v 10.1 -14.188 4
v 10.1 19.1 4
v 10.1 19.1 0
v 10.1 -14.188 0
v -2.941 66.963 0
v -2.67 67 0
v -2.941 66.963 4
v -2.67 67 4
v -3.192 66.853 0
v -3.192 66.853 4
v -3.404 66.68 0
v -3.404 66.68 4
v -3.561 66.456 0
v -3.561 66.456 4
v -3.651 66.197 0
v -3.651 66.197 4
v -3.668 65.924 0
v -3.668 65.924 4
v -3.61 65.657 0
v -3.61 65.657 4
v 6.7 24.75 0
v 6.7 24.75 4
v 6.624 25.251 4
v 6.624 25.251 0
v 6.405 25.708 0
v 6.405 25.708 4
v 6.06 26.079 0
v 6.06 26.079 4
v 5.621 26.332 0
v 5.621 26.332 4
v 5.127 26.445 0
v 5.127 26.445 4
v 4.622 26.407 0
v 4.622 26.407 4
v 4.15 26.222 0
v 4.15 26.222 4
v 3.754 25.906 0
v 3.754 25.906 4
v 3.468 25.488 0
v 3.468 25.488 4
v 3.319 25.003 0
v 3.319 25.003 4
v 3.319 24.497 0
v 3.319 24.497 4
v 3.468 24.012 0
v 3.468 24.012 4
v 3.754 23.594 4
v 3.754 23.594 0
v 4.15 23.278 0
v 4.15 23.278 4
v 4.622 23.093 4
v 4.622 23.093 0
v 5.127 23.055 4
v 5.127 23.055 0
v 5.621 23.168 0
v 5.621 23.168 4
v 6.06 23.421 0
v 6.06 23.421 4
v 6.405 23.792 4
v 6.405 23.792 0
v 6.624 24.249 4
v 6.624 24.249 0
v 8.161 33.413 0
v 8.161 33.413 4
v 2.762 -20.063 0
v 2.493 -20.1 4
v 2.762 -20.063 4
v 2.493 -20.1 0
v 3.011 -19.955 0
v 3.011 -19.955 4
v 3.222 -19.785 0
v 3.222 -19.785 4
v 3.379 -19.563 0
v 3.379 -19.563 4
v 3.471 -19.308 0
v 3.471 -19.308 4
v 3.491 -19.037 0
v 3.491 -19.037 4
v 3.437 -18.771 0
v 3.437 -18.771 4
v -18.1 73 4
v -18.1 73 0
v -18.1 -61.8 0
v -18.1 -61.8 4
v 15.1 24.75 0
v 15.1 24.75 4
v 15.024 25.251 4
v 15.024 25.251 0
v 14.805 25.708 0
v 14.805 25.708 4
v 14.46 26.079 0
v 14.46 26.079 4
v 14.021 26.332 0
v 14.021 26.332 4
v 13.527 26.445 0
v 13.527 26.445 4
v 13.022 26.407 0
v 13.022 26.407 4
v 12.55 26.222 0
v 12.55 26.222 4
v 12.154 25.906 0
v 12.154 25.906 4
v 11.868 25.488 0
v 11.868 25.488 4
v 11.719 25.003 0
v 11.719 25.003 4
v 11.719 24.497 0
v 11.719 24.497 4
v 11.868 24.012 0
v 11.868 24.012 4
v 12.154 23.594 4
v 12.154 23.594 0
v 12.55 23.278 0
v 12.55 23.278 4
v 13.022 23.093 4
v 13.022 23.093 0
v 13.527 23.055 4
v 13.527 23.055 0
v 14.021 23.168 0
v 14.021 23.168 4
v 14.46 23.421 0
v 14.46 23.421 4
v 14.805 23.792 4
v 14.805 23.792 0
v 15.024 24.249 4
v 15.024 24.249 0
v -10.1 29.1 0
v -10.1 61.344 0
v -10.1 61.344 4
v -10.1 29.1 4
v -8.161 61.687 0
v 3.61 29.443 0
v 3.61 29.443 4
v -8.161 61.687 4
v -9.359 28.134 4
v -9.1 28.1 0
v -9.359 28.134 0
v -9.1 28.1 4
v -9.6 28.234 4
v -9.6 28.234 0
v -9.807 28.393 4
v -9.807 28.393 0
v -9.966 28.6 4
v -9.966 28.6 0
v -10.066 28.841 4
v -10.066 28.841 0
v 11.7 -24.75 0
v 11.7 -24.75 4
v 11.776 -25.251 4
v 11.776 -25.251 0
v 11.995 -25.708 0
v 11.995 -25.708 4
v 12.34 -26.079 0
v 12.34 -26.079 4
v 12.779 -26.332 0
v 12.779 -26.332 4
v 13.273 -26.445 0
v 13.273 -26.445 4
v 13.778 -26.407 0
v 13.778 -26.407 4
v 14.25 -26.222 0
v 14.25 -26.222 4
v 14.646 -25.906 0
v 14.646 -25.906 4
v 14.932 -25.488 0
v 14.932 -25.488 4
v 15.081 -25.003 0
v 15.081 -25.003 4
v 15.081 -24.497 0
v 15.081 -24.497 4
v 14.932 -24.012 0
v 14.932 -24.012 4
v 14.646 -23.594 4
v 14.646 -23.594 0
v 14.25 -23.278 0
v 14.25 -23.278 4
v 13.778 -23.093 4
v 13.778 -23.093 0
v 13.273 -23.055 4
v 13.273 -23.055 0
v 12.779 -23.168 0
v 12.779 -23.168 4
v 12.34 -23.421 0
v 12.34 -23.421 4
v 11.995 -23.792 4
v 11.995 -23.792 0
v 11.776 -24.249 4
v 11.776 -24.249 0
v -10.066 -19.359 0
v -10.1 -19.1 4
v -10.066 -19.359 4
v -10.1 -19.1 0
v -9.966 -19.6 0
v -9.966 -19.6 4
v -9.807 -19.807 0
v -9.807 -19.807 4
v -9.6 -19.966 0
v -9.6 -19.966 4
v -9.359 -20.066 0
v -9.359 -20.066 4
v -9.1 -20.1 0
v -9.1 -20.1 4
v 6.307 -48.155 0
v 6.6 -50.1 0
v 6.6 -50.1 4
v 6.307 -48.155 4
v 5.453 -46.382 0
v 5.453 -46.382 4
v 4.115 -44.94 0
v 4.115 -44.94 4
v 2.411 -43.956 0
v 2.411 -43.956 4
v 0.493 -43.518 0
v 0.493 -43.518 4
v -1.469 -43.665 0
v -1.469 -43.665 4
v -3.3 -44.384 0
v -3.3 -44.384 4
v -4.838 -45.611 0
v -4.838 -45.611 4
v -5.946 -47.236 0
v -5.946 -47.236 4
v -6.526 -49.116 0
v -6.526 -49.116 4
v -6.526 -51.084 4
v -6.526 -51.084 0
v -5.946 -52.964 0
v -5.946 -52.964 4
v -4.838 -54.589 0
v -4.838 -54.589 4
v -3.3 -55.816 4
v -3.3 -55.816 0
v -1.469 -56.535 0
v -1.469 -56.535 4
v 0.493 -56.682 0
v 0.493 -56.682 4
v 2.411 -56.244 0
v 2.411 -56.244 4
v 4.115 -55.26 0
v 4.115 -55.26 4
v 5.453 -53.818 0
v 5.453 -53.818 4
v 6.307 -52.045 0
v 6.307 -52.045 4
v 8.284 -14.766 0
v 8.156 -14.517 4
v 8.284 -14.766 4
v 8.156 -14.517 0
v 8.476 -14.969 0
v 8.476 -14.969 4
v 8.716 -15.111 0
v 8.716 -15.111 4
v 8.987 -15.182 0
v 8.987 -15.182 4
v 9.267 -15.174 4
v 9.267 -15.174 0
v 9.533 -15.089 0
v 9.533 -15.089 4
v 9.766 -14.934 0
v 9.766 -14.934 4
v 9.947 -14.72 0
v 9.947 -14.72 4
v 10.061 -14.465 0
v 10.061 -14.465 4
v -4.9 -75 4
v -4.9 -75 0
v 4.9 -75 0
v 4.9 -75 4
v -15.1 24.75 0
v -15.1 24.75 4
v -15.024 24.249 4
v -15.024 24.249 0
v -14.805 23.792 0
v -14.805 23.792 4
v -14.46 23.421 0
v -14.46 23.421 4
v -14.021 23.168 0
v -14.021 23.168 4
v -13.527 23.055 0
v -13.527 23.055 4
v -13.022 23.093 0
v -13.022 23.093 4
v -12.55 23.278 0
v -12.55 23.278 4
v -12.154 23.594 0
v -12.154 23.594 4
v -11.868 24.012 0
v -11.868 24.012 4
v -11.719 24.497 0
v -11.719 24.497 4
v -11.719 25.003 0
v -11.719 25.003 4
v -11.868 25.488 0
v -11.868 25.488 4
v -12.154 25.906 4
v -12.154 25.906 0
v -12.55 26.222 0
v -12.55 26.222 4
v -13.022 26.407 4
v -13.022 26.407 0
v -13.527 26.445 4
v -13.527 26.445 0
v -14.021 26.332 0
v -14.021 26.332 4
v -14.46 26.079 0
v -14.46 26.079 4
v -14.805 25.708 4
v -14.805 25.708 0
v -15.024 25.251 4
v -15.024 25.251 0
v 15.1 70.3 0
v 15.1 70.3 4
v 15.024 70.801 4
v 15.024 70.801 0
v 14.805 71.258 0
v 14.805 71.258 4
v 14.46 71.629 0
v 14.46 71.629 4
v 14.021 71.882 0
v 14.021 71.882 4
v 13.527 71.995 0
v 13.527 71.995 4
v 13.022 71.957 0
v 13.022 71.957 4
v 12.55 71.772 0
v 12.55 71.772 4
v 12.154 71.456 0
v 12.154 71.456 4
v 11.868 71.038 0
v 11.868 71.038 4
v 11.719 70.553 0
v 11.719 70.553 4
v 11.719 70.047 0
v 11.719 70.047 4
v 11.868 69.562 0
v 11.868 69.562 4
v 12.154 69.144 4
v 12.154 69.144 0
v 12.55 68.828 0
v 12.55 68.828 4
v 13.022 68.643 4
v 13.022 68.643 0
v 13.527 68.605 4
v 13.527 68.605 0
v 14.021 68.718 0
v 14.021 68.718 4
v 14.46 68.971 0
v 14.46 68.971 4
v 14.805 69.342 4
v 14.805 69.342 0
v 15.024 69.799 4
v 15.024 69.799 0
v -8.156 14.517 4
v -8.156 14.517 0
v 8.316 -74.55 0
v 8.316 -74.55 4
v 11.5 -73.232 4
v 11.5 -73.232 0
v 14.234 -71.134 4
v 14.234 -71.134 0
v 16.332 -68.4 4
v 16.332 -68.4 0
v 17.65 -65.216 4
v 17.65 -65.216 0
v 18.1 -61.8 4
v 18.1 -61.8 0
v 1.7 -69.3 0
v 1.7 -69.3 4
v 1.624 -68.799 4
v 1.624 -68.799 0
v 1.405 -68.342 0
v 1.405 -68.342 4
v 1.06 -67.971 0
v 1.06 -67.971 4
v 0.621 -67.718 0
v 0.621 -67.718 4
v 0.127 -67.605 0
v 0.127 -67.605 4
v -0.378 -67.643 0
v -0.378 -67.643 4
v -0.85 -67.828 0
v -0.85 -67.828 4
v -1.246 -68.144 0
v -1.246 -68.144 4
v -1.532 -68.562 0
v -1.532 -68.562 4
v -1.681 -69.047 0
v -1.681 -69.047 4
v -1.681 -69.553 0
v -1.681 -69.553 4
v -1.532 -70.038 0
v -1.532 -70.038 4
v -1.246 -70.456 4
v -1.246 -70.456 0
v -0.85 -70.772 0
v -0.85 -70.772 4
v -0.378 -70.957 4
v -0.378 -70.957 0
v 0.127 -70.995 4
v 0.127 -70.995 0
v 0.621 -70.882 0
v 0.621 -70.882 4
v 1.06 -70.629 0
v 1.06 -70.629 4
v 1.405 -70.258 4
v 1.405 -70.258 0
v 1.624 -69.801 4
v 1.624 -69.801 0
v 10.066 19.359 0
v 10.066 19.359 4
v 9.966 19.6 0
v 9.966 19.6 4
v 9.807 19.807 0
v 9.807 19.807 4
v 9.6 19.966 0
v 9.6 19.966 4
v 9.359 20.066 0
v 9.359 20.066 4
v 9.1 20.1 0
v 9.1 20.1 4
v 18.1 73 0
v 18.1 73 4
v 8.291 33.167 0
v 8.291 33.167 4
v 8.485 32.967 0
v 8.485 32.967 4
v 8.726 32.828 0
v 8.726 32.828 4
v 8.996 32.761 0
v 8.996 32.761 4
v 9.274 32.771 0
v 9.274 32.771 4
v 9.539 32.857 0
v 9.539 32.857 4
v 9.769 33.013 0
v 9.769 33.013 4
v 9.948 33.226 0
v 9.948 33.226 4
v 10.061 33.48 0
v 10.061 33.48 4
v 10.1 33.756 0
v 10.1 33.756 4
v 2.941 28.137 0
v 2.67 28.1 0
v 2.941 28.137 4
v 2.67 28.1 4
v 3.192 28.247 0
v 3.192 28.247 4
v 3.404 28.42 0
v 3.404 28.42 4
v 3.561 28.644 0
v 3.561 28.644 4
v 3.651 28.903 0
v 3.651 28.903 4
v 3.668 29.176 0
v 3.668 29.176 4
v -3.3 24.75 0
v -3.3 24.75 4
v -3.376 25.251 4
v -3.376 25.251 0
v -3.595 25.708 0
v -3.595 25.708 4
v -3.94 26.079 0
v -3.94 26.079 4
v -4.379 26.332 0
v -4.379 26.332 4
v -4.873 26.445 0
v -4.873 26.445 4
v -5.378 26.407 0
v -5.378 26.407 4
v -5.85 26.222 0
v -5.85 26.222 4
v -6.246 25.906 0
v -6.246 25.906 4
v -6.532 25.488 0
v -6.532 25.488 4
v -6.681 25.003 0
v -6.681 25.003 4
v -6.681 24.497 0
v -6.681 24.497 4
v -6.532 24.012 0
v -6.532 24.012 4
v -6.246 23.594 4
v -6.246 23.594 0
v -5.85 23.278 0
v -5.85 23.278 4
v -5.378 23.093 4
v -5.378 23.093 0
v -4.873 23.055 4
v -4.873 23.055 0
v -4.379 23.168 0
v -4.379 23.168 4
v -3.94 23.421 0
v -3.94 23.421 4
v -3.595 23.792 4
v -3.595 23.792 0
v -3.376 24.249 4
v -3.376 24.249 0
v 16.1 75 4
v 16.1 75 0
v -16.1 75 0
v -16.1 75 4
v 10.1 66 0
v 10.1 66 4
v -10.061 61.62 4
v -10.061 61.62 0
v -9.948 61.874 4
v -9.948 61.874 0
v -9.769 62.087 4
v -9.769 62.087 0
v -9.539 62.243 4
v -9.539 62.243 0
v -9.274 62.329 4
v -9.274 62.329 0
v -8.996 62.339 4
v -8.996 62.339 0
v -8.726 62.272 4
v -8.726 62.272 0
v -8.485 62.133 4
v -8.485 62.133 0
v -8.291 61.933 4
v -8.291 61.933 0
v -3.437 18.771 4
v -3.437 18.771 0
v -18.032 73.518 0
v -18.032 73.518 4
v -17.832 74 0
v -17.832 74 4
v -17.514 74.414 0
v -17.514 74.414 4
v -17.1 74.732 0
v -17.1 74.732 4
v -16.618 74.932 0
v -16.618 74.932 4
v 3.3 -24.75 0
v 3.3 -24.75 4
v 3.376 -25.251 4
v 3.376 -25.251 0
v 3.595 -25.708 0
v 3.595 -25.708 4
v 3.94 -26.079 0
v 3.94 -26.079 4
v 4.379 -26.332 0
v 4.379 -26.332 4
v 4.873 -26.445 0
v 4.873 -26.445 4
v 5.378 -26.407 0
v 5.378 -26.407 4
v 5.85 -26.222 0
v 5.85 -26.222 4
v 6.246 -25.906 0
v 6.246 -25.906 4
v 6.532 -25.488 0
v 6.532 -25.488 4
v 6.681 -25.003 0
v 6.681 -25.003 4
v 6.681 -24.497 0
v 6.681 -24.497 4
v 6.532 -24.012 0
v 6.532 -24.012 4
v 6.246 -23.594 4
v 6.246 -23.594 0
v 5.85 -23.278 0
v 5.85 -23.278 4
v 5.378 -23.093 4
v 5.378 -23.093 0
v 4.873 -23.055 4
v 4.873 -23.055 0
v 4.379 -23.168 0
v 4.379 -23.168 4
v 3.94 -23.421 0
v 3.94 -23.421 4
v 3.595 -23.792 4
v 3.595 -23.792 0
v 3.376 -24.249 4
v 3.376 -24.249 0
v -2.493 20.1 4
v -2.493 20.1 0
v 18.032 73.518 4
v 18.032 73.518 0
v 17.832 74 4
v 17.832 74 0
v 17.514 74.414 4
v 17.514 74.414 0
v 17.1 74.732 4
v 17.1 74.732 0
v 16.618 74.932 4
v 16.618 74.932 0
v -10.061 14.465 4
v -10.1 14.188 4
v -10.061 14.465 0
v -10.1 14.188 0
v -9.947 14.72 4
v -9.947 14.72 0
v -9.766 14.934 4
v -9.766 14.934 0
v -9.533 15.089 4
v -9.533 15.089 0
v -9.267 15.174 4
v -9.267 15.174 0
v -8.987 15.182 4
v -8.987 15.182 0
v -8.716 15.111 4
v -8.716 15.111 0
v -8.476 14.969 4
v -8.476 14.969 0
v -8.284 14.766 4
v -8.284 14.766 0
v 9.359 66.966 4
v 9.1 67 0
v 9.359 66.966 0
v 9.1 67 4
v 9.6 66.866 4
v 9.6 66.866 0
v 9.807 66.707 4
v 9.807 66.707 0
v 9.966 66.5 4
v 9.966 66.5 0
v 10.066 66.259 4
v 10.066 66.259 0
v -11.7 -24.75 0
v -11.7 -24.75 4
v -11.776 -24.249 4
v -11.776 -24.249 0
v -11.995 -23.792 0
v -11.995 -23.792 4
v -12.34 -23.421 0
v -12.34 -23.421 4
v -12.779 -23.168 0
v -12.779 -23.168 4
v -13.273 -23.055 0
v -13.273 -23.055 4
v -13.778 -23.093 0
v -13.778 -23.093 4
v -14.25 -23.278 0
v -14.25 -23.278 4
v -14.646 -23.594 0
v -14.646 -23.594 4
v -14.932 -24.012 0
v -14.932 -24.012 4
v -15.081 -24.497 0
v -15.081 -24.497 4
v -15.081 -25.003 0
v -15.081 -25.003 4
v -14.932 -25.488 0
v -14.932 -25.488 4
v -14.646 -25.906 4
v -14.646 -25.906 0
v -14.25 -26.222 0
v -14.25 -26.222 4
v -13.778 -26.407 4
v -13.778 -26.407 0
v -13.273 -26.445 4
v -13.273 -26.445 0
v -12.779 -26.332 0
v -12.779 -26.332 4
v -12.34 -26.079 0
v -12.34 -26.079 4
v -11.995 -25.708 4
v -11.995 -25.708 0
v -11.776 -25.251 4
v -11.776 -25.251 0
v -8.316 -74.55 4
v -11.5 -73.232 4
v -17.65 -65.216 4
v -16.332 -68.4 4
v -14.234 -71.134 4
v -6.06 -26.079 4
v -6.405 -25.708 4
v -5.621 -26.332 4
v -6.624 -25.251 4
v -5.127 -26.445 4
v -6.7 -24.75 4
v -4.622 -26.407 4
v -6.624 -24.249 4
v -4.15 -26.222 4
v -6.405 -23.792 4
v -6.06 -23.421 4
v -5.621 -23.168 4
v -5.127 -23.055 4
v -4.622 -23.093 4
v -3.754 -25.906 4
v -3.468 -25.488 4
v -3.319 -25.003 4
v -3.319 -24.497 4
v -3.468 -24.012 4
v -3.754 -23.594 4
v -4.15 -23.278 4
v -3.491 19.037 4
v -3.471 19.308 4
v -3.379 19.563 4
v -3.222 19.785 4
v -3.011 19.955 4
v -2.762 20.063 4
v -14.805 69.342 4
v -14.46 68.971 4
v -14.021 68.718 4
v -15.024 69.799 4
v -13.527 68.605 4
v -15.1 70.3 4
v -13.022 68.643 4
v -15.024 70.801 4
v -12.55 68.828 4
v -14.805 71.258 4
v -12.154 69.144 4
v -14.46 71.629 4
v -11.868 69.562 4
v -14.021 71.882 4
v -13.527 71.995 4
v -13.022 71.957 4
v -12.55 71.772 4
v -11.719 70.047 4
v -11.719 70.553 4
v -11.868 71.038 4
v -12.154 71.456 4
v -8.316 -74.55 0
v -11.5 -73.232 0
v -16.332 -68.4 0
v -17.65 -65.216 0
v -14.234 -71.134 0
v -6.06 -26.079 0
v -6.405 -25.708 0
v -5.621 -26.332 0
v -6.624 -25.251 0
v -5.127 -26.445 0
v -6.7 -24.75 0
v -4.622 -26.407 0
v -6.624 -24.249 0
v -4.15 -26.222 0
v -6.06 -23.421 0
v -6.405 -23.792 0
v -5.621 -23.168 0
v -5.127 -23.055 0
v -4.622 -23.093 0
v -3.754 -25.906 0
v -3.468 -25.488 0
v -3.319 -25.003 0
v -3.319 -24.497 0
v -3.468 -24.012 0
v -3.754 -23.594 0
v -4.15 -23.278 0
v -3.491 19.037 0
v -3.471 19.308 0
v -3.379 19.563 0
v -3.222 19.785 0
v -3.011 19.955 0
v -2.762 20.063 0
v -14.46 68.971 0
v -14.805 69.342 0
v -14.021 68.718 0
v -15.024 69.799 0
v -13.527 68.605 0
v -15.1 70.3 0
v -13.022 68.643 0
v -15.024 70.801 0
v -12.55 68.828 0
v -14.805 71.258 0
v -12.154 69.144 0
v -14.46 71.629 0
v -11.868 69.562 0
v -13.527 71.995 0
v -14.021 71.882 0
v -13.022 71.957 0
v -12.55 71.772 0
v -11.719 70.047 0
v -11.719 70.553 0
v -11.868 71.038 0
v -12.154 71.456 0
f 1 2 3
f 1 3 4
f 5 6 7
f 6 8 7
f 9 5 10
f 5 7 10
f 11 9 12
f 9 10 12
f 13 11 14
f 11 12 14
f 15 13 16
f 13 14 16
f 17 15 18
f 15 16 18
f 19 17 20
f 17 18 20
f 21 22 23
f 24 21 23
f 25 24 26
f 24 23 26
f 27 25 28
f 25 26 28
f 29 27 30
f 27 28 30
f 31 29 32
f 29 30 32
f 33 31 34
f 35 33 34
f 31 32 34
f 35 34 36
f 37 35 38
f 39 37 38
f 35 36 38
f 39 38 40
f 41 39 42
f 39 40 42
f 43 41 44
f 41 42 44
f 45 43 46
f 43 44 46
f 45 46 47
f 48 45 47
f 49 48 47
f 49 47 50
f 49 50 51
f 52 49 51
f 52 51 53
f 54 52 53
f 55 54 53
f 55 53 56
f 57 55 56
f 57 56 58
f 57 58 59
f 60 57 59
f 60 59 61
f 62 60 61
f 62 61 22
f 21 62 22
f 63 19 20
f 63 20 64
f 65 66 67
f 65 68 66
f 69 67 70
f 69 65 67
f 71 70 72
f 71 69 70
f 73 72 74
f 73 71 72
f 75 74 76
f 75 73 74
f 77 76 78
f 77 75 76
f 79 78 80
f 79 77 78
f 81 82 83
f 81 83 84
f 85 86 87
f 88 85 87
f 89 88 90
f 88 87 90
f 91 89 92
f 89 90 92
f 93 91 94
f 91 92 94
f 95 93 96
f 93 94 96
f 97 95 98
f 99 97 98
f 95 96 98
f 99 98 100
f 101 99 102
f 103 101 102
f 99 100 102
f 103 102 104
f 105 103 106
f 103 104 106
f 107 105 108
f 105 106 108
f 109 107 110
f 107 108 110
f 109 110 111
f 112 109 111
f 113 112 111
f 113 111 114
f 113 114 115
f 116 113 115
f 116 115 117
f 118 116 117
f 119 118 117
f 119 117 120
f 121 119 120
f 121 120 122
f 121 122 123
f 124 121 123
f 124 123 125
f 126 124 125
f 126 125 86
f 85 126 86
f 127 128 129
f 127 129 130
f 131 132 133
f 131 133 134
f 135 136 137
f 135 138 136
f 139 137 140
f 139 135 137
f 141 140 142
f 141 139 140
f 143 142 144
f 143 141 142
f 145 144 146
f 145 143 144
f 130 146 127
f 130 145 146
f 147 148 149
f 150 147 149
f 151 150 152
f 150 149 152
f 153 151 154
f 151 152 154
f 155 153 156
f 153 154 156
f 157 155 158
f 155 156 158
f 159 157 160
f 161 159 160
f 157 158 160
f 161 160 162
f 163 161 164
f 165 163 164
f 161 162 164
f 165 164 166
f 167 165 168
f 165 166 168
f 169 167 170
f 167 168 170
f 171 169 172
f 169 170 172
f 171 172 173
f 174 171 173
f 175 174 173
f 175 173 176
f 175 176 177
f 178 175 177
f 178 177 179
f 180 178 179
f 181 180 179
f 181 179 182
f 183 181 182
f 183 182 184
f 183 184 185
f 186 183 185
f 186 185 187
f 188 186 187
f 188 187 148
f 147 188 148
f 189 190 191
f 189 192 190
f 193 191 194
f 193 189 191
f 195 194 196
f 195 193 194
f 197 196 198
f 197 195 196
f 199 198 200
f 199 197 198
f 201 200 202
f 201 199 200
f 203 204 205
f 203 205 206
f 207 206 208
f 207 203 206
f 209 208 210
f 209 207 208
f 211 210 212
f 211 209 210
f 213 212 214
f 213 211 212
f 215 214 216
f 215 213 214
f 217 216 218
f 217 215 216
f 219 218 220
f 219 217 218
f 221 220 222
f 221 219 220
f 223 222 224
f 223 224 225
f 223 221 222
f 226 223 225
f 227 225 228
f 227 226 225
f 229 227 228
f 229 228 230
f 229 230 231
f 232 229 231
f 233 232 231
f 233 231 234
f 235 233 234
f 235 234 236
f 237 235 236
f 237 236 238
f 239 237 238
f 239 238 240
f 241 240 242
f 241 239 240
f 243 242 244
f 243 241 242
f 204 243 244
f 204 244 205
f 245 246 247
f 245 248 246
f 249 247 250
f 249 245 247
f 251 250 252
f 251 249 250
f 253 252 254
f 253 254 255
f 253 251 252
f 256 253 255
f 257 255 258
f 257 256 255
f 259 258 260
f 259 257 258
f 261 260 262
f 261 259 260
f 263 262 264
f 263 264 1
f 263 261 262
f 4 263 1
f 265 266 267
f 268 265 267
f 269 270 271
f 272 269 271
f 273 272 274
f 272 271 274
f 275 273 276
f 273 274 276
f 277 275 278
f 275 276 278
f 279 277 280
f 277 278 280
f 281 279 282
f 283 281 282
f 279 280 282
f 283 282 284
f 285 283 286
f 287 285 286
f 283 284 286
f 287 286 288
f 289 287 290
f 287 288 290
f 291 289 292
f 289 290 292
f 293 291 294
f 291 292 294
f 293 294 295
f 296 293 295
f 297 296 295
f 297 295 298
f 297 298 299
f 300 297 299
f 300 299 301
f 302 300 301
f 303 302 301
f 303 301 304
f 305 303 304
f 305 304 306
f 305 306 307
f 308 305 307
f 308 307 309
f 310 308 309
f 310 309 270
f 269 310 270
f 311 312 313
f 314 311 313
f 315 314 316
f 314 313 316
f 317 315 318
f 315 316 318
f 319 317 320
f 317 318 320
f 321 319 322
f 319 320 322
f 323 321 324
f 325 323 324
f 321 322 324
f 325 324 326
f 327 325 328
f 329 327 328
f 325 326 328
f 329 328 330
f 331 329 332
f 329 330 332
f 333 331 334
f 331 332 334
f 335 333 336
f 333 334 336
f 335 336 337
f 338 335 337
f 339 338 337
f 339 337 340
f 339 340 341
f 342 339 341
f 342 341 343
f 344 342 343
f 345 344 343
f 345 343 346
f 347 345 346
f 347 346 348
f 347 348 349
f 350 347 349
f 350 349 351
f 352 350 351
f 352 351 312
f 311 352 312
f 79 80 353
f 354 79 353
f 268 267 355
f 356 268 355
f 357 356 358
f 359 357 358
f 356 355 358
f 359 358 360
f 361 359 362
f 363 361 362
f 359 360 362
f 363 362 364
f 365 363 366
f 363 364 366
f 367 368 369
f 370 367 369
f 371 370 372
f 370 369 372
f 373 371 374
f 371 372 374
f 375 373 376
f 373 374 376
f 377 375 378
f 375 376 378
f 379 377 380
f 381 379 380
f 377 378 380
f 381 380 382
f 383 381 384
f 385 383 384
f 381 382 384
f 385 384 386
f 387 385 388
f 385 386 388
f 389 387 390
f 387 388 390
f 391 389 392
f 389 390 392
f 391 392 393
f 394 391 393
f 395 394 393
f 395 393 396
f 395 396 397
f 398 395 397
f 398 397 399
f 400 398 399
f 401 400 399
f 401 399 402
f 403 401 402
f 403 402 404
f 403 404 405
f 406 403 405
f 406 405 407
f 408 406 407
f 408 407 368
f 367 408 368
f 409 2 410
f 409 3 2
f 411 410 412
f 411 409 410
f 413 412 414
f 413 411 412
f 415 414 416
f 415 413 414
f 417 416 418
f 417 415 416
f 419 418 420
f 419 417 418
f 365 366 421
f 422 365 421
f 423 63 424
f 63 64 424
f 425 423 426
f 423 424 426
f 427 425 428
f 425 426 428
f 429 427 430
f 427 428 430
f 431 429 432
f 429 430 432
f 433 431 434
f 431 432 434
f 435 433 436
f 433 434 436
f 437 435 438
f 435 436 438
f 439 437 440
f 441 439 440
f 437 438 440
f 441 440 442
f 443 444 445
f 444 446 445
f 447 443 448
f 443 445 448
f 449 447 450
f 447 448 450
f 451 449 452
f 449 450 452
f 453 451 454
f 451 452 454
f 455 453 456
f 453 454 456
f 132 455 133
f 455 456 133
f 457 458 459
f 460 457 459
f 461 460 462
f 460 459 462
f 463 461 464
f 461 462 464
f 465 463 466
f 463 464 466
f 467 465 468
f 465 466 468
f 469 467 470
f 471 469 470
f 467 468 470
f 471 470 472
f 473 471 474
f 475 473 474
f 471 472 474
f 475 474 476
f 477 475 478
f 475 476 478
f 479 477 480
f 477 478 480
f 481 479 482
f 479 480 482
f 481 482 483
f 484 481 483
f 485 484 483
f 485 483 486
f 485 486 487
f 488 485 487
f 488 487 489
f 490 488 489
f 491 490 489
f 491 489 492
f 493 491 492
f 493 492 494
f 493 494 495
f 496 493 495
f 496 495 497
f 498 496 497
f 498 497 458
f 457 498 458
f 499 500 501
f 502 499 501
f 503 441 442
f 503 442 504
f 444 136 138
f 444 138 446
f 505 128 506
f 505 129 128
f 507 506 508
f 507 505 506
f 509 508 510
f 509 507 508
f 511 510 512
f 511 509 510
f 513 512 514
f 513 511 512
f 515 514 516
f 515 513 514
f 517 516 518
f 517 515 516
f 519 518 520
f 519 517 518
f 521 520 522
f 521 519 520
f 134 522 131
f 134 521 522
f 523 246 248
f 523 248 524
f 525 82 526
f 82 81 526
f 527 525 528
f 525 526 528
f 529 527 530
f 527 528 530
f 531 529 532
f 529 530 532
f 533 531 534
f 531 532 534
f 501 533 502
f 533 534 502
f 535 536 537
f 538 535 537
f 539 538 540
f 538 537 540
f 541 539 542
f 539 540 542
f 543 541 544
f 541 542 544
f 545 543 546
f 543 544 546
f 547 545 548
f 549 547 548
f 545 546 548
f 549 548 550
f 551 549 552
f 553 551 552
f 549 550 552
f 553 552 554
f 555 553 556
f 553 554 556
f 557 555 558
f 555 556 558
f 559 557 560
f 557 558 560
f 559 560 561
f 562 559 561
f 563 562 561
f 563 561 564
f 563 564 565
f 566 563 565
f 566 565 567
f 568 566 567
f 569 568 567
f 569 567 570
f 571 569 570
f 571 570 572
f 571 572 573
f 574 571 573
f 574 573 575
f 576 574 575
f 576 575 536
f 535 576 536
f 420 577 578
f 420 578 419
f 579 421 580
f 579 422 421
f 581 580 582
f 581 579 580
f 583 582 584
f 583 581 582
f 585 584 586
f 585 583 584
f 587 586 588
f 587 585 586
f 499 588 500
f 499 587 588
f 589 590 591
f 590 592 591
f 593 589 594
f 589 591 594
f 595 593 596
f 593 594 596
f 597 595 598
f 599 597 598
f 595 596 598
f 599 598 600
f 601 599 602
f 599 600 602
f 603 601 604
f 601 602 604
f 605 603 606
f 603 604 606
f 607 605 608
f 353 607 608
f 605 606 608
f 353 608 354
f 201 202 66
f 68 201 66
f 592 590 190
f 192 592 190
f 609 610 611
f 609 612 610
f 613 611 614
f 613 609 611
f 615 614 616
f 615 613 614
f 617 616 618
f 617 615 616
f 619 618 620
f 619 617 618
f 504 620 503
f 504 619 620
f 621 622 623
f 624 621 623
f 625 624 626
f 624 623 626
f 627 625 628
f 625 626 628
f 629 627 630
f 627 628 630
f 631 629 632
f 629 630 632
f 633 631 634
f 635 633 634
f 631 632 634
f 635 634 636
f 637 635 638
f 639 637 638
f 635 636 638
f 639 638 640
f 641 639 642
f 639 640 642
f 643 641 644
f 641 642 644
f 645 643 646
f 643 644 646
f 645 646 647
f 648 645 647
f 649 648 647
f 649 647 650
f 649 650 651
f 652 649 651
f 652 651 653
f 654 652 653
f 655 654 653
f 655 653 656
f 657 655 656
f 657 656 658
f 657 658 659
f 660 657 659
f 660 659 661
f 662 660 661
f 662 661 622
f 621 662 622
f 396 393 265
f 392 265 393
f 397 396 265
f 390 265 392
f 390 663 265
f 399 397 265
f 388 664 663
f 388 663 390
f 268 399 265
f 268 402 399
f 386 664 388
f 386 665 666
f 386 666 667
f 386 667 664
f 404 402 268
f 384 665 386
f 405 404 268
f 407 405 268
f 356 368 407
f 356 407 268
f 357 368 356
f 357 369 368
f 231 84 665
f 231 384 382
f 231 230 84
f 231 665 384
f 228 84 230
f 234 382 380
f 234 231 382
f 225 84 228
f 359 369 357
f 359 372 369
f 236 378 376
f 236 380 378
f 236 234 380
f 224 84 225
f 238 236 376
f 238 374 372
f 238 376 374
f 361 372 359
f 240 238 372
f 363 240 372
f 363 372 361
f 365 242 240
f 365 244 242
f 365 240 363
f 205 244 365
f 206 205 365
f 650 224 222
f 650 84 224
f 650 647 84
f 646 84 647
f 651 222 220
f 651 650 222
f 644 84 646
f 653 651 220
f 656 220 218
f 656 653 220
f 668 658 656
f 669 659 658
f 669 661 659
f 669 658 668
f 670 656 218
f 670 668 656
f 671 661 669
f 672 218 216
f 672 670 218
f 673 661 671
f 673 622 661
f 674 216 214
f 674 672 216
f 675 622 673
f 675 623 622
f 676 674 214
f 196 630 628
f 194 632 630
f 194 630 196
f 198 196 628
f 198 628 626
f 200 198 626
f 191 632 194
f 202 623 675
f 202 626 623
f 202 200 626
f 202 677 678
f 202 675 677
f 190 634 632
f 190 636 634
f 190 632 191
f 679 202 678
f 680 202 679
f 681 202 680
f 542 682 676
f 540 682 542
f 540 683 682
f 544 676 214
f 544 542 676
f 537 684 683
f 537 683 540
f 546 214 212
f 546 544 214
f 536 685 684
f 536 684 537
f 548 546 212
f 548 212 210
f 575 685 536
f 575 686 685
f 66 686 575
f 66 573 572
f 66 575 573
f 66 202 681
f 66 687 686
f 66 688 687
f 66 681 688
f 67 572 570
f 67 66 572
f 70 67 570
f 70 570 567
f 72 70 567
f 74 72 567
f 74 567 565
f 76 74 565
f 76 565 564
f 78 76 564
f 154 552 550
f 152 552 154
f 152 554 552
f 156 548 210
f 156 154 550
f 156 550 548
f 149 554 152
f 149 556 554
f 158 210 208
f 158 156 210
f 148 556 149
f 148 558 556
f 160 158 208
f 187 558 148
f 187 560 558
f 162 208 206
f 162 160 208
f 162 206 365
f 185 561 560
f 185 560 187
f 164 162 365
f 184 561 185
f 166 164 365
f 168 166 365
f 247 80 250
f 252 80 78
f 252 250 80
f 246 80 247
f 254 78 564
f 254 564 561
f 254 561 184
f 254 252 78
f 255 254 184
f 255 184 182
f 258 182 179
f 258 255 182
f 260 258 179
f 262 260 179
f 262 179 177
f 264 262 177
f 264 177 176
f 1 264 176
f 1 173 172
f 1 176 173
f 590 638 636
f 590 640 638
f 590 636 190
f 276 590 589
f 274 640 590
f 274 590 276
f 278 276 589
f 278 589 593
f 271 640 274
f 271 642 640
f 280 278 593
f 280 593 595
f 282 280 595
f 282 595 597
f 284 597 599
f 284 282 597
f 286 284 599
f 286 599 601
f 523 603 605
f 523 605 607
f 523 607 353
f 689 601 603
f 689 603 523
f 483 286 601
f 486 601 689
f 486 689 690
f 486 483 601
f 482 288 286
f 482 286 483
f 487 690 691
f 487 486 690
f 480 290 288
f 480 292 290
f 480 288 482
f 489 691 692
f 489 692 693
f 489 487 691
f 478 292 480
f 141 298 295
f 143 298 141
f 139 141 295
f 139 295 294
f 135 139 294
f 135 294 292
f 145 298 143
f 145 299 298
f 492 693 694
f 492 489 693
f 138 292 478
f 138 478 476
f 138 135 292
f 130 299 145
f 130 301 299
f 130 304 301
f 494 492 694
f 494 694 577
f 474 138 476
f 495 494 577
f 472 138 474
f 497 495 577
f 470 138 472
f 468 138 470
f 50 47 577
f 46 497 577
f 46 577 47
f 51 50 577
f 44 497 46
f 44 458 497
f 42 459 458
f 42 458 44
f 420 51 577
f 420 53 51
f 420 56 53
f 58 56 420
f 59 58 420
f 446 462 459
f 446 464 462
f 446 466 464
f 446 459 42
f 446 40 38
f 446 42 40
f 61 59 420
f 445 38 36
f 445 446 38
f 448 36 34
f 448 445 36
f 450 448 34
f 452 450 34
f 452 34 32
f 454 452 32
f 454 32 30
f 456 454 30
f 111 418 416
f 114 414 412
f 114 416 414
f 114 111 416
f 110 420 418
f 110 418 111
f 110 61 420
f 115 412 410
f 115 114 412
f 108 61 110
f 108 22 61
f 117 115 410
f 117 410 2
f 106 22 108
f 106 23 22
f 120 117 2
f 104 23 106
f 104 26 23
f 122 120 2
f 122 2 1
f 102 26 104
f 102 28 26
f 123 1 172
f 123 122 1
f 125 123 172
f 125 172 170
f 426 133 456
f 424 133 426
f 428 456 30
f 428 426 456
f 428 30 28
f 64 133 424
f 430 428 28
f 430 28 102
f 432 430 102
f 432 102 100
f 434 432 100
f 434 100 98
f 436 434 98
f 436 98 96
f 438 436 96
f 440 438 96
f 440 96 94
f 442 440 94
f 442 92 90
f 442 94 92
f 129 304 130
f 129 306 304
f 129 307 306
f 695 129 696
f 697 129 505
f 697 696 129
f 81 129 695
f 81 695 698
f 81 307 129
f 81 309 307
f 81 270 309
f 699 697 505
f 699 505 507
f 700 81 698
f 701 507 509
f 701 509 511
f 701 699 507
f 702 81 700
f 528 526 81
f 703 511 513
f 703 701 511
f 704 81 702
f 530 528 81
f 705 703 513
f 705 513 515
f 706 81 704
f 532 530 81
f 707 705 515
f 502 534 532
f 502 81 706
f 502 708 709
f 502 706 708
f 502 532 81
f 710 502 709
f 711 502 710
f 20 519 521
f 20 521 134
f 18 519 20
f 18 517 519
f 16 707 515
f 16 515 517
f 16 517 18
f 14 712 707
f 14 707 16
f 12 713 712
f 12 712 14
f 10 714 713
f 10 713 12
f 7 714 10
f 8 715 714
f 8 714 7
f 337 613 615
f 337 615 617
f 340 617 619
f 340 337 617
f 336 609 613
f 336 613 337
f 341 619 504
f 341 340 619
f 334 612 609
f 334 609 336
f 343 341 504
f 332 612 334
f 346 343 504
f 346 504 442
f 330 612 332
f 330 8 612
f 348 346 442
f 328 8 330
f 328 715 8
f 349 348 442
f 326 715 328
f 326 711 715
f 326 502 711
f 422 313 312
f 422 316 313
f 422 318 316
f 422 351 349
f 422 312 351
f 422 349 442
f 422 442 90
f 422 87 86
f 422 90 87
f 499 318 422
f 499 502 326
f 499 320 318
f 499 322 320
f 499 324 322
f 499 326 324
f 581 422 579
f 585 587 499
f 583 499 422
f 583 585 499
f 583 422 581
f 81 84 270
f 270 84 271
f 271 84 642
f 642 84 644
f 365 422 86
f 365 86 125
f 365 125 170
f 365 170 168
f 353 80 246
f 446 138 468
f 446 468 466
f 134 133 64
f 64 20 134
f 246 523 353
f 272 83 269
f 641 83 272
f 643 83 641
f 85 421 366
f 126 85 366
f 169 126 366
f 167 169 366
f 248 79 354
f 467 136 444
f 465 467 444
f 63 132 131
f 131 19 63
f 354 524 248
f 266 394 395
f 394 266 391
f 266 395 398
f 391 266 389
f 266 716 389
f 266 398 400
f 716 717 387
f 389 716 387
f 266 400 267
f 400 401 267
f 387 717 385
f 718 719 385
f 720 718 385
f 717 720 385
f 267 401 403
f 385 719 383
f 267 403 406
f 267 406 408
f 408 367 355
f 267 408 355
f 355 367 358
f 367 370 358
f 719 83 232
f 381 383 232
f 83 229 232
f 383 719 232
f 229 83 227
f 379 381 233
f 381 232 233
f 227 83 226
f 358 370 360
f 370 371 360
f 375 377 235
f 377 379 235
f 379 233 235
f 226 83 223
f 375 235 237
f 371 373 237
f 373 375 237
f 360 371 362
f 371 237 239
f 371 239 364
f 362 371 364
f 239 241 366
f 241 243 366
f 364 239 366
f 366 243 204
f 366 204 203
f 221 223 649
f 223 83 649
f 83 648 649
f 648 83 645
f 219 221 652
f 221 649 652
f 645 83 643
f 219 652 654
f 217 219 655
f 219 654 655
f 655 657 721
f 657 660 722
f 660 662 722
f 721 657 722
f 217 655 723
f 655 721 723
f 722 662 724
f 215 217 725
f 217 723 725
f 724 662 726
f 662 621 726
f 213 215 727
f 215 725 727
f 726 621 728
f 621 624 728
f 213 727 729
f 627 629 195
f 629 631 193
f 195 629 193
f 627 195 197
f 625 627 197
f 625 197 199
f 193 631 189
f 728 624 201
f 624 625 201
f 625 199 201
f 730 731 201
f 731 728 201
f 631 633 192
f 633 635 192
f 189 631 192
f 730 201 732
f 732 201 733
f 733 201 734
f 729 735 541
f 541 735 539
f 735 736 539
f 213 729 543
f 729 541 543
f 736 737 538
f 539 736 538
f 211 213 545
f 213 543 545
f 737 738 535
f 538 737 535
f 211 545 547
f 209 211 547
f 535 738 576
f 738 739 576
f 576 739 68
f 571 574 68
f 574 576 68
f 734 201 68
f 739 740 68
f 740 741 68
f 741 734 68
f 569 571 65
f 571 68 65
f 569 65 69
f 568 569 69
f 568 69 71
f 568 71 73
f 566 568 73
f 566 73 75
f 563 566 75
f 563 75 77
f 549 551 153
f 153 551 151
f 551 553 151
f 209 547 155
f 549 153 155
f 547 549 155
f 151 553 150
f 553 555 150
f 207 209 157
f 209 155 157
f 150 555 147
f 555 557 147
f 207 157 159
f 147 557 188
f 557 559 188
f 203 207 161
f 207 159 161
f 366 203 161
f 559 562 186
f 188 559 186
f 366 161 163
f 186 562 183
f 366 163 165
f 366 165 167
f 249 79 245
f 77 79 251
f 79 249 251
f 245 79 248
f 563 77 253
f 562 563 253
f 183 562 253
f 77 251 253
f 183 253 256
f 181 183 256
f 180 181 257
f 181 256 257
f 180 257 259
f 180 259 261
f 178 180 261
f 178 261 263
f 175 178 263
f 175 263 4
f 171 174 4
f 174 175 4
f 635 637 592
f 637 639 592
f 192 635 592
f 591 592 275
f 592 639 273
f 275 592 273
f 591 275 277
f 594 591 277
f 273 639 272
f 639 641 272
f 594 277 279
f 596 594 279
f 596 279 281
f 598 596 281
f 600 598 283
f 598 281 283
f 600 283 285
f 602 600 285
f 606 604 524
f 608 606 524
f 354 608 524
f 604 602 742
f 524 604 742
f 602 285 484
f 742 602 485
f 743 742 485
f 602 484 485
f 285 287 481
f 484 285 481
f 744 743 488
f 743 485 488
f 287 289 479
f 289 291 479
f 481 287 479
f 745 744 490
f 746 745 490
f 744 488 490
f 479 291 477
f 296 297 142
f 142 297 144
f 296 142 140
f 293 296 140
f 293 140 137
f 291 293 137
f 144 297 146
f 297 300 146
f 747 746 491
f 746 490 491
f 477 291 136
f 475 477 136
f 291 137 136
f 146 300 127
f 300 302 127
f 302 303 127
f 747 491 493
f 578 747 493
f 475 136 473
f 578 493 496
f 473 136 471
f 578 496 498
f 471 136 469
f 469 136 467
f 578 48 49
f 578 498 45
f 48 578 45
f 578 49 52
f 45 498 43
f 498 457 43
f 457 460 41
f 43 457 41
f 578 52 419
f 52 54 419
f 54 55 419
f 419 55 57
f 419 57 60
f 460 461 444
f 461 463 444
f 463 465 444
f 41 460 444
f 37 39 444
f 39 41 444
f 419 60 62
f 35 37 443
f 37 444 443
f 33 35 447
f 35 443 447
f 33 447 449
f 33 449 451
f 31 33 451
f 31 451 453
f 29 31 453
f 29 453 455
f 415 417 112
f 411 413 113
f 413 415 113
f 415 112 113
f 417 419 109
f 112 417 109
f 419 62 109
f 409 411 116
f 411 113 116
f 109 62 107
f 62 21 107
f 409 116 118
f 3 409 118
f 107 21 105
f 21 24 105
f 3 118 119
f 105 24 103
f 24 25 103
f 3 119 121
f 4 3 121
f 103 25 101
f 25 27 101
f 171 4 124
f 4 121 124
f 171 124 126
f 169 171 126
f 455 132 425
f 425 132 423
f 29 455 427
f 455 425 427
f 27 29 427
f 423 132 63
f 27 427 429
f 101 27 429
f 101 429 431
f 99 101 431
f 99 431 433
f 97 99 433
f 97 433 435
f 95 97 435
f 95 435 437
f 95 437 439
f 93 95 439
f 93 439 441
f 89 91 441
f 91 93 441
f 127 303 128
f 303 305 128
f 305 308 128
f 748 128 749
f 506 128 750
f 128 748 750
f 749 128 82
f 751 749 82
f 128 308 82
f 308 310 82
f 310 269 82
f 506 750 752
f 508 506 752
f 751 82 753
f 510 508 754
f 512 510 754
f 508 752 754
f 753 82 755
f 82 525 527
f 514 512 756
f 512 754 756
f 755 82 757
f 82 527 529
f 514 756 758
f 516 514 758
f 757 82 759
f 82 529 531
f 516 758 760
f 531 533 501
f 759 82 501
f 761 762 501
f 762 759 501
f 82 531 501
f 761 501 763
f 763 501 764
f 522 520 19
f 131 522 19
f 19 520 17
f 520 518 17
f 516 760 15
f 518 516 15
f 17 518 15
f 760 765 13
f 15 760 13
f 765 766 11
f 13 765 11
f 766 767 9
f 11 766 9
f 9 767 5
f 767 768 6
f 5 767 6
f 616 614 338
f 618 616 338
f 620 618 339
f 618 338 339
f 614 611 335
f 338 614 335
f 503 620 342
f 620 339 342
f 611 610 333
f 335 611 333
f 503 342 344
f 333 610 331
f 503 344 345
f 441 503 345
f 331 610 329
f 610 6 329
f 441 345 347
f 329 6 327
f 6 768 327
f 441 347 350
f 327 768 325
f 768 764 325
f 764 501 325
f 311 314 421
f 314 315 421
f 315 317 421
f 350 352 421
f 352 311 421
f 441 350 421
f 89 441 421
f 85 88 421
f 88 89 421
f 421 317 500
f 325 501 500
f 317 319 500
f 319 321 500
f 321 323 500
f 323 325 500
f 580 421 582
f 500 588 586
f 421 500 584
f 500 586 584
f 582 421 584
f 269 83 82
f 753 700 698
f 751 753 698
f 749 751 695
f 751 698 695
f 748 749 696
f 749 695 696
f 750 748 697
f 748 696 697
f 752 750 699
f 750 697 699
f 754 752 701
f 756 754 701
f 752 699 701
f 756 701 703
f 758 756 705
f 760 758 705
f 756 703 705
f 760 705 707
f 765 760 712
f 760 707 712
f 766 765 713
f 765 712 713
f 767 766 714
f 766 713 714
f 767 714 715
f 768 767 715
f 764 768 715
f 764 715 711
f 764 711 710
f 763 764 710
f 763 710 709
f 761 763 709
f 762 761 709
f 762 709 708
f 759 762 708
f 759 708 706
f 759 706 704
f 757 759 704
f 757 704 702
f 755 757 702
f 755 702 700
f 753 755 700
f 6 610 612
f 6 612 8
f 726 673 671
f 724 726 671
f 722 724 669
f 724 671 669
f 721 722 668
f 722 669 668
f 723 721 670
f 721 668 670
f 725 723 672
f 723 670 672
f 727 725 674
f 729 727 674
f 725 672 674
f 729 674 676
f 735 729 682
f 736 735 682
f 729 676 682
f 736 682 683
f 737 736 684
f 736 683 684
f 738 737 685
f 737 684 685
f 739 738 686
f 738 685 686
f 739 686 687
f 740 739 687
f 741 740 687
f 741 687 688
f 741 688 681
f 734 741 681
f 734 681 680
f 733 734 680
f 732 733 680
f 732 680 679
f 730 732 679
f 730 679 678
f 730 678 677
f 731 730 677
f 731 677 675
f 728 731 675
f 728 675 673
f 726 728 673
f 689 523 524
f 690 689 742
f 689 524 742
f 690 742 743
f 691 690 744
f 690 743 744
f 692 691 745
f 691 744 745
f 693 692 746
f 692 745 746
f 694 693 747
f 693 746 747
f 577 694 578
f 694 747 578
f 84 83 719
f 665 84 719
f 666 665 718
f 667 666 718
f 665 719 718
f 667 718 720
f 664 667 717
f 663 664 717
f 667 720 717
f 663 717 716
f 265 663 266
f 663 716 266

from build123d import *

# Parameters (mm, degrees)
SKETCH1_R           = 6.6
SKETCH1_W           = 20.2
SKETCH1_H           = 40.2
BASE_PLATE_DEPTH    = 4
FILLET1_R           = 1
FILLET2_R           = 2
SKETCH2_R           = 1.7
CUT_EXTRUDE1_DEPTH  = 78.256779638
SKETCH3_W           = 4
SKETCH3_H           = 40.2
BOSS_EXTRUDE1_DEPTH = 28.2
CUT_EXTRUDE2_DEPTH  = 78.256779638
FILLET3_R           = 1


with BuildPart() as part:
    # Sketch1 → Base Plate (new body)
    with BuildSketch(Plane.XY):
        with BuildLine():
            Line((-4.9, -75), (4.9, -75))
            ThreePointArc((4.9, -75), (14.233809512, -71.133809512), (18.1, -61.8))
            Line((18.1, -61.8), (18.1, 75))
            Line((18.1, 75), (-18.1, 75))
            Line((-18.1, 75), (-18.1, -61.8))
            ThreePointArc((-18.1, -61.8), (-14.233809512, -71.133809512), (-4.9, -75))
        make_face()
        with Locations((0, -50.1)):
            Circle(SKETCH1_R, mode=Mode.SUBTRACT)
        Polygon((-10.1, 28.1), (4.1, 28.1), (-10.1, 67), align=None, mode=Mode.SUBTRACT)
        Rectangle(SKETCH1_W, SKETCH1_H, mode=Mode.SUBTRACT)
        Polygon((10.1, 67), (-4.1, 67), (10.1, 28.1), align=None, mode=Mode.SUBTRACT)
    extrude(amount=BASE_PLATE_DEPTH)

    # Fillet1
    fillet1_edges = [part.edges().sort_by_distance(p)[0] for p in [
        (10.1, 28.1, 2),
        (10.1, 67, 2),
        (-4.1, 67, 2),
        (-10.1, 67, 2),
        (-10.1, 28.1, 2),
        (4.1, 28.1, 2),
    ]]
    fillet(fillet1_edges, radius=FILLET1_R)

    # Fillet2
    fillet2_edges = [part.edges().sort_by_distance(p)[0] for p in [
        (-18.1, 75, 2),
        (18.1, 75, 2),
    ]]
    fillet(fillet2_edges, radius=FILLET2_R)

    # Sketch2 → Cut-Extrude1 (cut, through all)
    with BuildSketch(Plane.XY.offset(4)):
        with Locations((5, 24.75)):
            Circle(SKETCH2_R)
        with Locations((-5, 24.75)):
            Circle(SKETCH2_R)
        with Locations(Location((-5, -24.75, 0), (0, 0, 180))):
            Circle(SKETCH2_R)
        with Locations(Location((5, -24.75, 0), (0, 0, 180))):
            Circle(SKETCH2_R)
        with Locations((13.4, 24.75)):
            Circle(SKETCH2_R)
        with Locations(Location((-13.4, 24.75, 0), (0, 0, 180))):
            Circle(SKETCH2_R)
        with Locations(Location((13.4, -24.75, 0), (0, 0, 180))):
            Circle(SKETCH2_R)
        with Locations((-13.4, -24.75)):
            Circle(SKETCH2_R)
        with Locations((13.4, 70.3)):
            Circle(SKETCH2_R)
        with Locations(Location((-13.4, 70.3, 0), (0, 0, 180))):
            Circle(SKETCH2_R)
        with Locations((0, -69.3)):
            Circle(SKETCH2_R)
    extrude(amount=-CUT_EXTRUDE1_DEPTH, mode=Mode.SUBTRACT)

    # Sketch3 → Boss-Extrude1 (add, through all)
    with BuildSketch(Plane.ZY.offset(-10.1)):
        with Locations((2, 0)):
            Rectangle(SKETCH3_W, SKETCH3_H)
    extrude(amount=BOSS_EXTRUDE1_DEPTH)

    # Sketch4 → Cut-Extrude2 (cut, through all)
    with BuildSketch(Plane.XY.offset(4)):
        Polygon((-10.1, 20.1), (-10.1, -20.1), (3.9, -20.1), align=None)
        Polygon((-3.9, 20.1), (10.1, 20.1), (10.1, -20.1), align=None)
    extrude(amount=-CUT_EXTRUDE2_DEPTH, mode=Mode.SUBTRACT)

    # Fillet3
    fillet3_edges = [part.edges().sort_by_distance(p)[0] for p in [
        (10.1, -20.1, 2),
        (-3.9, 20.1, 2),
        (10.1, 20.1, 2),
        (-10.1, 20.1, 2),
        (3.9, -20.1, 2),
        (-10.1, -20.1, 2),
    ]]
    fillet(fillet3_edges, radius=FILLET3_R)


solid = part.part
